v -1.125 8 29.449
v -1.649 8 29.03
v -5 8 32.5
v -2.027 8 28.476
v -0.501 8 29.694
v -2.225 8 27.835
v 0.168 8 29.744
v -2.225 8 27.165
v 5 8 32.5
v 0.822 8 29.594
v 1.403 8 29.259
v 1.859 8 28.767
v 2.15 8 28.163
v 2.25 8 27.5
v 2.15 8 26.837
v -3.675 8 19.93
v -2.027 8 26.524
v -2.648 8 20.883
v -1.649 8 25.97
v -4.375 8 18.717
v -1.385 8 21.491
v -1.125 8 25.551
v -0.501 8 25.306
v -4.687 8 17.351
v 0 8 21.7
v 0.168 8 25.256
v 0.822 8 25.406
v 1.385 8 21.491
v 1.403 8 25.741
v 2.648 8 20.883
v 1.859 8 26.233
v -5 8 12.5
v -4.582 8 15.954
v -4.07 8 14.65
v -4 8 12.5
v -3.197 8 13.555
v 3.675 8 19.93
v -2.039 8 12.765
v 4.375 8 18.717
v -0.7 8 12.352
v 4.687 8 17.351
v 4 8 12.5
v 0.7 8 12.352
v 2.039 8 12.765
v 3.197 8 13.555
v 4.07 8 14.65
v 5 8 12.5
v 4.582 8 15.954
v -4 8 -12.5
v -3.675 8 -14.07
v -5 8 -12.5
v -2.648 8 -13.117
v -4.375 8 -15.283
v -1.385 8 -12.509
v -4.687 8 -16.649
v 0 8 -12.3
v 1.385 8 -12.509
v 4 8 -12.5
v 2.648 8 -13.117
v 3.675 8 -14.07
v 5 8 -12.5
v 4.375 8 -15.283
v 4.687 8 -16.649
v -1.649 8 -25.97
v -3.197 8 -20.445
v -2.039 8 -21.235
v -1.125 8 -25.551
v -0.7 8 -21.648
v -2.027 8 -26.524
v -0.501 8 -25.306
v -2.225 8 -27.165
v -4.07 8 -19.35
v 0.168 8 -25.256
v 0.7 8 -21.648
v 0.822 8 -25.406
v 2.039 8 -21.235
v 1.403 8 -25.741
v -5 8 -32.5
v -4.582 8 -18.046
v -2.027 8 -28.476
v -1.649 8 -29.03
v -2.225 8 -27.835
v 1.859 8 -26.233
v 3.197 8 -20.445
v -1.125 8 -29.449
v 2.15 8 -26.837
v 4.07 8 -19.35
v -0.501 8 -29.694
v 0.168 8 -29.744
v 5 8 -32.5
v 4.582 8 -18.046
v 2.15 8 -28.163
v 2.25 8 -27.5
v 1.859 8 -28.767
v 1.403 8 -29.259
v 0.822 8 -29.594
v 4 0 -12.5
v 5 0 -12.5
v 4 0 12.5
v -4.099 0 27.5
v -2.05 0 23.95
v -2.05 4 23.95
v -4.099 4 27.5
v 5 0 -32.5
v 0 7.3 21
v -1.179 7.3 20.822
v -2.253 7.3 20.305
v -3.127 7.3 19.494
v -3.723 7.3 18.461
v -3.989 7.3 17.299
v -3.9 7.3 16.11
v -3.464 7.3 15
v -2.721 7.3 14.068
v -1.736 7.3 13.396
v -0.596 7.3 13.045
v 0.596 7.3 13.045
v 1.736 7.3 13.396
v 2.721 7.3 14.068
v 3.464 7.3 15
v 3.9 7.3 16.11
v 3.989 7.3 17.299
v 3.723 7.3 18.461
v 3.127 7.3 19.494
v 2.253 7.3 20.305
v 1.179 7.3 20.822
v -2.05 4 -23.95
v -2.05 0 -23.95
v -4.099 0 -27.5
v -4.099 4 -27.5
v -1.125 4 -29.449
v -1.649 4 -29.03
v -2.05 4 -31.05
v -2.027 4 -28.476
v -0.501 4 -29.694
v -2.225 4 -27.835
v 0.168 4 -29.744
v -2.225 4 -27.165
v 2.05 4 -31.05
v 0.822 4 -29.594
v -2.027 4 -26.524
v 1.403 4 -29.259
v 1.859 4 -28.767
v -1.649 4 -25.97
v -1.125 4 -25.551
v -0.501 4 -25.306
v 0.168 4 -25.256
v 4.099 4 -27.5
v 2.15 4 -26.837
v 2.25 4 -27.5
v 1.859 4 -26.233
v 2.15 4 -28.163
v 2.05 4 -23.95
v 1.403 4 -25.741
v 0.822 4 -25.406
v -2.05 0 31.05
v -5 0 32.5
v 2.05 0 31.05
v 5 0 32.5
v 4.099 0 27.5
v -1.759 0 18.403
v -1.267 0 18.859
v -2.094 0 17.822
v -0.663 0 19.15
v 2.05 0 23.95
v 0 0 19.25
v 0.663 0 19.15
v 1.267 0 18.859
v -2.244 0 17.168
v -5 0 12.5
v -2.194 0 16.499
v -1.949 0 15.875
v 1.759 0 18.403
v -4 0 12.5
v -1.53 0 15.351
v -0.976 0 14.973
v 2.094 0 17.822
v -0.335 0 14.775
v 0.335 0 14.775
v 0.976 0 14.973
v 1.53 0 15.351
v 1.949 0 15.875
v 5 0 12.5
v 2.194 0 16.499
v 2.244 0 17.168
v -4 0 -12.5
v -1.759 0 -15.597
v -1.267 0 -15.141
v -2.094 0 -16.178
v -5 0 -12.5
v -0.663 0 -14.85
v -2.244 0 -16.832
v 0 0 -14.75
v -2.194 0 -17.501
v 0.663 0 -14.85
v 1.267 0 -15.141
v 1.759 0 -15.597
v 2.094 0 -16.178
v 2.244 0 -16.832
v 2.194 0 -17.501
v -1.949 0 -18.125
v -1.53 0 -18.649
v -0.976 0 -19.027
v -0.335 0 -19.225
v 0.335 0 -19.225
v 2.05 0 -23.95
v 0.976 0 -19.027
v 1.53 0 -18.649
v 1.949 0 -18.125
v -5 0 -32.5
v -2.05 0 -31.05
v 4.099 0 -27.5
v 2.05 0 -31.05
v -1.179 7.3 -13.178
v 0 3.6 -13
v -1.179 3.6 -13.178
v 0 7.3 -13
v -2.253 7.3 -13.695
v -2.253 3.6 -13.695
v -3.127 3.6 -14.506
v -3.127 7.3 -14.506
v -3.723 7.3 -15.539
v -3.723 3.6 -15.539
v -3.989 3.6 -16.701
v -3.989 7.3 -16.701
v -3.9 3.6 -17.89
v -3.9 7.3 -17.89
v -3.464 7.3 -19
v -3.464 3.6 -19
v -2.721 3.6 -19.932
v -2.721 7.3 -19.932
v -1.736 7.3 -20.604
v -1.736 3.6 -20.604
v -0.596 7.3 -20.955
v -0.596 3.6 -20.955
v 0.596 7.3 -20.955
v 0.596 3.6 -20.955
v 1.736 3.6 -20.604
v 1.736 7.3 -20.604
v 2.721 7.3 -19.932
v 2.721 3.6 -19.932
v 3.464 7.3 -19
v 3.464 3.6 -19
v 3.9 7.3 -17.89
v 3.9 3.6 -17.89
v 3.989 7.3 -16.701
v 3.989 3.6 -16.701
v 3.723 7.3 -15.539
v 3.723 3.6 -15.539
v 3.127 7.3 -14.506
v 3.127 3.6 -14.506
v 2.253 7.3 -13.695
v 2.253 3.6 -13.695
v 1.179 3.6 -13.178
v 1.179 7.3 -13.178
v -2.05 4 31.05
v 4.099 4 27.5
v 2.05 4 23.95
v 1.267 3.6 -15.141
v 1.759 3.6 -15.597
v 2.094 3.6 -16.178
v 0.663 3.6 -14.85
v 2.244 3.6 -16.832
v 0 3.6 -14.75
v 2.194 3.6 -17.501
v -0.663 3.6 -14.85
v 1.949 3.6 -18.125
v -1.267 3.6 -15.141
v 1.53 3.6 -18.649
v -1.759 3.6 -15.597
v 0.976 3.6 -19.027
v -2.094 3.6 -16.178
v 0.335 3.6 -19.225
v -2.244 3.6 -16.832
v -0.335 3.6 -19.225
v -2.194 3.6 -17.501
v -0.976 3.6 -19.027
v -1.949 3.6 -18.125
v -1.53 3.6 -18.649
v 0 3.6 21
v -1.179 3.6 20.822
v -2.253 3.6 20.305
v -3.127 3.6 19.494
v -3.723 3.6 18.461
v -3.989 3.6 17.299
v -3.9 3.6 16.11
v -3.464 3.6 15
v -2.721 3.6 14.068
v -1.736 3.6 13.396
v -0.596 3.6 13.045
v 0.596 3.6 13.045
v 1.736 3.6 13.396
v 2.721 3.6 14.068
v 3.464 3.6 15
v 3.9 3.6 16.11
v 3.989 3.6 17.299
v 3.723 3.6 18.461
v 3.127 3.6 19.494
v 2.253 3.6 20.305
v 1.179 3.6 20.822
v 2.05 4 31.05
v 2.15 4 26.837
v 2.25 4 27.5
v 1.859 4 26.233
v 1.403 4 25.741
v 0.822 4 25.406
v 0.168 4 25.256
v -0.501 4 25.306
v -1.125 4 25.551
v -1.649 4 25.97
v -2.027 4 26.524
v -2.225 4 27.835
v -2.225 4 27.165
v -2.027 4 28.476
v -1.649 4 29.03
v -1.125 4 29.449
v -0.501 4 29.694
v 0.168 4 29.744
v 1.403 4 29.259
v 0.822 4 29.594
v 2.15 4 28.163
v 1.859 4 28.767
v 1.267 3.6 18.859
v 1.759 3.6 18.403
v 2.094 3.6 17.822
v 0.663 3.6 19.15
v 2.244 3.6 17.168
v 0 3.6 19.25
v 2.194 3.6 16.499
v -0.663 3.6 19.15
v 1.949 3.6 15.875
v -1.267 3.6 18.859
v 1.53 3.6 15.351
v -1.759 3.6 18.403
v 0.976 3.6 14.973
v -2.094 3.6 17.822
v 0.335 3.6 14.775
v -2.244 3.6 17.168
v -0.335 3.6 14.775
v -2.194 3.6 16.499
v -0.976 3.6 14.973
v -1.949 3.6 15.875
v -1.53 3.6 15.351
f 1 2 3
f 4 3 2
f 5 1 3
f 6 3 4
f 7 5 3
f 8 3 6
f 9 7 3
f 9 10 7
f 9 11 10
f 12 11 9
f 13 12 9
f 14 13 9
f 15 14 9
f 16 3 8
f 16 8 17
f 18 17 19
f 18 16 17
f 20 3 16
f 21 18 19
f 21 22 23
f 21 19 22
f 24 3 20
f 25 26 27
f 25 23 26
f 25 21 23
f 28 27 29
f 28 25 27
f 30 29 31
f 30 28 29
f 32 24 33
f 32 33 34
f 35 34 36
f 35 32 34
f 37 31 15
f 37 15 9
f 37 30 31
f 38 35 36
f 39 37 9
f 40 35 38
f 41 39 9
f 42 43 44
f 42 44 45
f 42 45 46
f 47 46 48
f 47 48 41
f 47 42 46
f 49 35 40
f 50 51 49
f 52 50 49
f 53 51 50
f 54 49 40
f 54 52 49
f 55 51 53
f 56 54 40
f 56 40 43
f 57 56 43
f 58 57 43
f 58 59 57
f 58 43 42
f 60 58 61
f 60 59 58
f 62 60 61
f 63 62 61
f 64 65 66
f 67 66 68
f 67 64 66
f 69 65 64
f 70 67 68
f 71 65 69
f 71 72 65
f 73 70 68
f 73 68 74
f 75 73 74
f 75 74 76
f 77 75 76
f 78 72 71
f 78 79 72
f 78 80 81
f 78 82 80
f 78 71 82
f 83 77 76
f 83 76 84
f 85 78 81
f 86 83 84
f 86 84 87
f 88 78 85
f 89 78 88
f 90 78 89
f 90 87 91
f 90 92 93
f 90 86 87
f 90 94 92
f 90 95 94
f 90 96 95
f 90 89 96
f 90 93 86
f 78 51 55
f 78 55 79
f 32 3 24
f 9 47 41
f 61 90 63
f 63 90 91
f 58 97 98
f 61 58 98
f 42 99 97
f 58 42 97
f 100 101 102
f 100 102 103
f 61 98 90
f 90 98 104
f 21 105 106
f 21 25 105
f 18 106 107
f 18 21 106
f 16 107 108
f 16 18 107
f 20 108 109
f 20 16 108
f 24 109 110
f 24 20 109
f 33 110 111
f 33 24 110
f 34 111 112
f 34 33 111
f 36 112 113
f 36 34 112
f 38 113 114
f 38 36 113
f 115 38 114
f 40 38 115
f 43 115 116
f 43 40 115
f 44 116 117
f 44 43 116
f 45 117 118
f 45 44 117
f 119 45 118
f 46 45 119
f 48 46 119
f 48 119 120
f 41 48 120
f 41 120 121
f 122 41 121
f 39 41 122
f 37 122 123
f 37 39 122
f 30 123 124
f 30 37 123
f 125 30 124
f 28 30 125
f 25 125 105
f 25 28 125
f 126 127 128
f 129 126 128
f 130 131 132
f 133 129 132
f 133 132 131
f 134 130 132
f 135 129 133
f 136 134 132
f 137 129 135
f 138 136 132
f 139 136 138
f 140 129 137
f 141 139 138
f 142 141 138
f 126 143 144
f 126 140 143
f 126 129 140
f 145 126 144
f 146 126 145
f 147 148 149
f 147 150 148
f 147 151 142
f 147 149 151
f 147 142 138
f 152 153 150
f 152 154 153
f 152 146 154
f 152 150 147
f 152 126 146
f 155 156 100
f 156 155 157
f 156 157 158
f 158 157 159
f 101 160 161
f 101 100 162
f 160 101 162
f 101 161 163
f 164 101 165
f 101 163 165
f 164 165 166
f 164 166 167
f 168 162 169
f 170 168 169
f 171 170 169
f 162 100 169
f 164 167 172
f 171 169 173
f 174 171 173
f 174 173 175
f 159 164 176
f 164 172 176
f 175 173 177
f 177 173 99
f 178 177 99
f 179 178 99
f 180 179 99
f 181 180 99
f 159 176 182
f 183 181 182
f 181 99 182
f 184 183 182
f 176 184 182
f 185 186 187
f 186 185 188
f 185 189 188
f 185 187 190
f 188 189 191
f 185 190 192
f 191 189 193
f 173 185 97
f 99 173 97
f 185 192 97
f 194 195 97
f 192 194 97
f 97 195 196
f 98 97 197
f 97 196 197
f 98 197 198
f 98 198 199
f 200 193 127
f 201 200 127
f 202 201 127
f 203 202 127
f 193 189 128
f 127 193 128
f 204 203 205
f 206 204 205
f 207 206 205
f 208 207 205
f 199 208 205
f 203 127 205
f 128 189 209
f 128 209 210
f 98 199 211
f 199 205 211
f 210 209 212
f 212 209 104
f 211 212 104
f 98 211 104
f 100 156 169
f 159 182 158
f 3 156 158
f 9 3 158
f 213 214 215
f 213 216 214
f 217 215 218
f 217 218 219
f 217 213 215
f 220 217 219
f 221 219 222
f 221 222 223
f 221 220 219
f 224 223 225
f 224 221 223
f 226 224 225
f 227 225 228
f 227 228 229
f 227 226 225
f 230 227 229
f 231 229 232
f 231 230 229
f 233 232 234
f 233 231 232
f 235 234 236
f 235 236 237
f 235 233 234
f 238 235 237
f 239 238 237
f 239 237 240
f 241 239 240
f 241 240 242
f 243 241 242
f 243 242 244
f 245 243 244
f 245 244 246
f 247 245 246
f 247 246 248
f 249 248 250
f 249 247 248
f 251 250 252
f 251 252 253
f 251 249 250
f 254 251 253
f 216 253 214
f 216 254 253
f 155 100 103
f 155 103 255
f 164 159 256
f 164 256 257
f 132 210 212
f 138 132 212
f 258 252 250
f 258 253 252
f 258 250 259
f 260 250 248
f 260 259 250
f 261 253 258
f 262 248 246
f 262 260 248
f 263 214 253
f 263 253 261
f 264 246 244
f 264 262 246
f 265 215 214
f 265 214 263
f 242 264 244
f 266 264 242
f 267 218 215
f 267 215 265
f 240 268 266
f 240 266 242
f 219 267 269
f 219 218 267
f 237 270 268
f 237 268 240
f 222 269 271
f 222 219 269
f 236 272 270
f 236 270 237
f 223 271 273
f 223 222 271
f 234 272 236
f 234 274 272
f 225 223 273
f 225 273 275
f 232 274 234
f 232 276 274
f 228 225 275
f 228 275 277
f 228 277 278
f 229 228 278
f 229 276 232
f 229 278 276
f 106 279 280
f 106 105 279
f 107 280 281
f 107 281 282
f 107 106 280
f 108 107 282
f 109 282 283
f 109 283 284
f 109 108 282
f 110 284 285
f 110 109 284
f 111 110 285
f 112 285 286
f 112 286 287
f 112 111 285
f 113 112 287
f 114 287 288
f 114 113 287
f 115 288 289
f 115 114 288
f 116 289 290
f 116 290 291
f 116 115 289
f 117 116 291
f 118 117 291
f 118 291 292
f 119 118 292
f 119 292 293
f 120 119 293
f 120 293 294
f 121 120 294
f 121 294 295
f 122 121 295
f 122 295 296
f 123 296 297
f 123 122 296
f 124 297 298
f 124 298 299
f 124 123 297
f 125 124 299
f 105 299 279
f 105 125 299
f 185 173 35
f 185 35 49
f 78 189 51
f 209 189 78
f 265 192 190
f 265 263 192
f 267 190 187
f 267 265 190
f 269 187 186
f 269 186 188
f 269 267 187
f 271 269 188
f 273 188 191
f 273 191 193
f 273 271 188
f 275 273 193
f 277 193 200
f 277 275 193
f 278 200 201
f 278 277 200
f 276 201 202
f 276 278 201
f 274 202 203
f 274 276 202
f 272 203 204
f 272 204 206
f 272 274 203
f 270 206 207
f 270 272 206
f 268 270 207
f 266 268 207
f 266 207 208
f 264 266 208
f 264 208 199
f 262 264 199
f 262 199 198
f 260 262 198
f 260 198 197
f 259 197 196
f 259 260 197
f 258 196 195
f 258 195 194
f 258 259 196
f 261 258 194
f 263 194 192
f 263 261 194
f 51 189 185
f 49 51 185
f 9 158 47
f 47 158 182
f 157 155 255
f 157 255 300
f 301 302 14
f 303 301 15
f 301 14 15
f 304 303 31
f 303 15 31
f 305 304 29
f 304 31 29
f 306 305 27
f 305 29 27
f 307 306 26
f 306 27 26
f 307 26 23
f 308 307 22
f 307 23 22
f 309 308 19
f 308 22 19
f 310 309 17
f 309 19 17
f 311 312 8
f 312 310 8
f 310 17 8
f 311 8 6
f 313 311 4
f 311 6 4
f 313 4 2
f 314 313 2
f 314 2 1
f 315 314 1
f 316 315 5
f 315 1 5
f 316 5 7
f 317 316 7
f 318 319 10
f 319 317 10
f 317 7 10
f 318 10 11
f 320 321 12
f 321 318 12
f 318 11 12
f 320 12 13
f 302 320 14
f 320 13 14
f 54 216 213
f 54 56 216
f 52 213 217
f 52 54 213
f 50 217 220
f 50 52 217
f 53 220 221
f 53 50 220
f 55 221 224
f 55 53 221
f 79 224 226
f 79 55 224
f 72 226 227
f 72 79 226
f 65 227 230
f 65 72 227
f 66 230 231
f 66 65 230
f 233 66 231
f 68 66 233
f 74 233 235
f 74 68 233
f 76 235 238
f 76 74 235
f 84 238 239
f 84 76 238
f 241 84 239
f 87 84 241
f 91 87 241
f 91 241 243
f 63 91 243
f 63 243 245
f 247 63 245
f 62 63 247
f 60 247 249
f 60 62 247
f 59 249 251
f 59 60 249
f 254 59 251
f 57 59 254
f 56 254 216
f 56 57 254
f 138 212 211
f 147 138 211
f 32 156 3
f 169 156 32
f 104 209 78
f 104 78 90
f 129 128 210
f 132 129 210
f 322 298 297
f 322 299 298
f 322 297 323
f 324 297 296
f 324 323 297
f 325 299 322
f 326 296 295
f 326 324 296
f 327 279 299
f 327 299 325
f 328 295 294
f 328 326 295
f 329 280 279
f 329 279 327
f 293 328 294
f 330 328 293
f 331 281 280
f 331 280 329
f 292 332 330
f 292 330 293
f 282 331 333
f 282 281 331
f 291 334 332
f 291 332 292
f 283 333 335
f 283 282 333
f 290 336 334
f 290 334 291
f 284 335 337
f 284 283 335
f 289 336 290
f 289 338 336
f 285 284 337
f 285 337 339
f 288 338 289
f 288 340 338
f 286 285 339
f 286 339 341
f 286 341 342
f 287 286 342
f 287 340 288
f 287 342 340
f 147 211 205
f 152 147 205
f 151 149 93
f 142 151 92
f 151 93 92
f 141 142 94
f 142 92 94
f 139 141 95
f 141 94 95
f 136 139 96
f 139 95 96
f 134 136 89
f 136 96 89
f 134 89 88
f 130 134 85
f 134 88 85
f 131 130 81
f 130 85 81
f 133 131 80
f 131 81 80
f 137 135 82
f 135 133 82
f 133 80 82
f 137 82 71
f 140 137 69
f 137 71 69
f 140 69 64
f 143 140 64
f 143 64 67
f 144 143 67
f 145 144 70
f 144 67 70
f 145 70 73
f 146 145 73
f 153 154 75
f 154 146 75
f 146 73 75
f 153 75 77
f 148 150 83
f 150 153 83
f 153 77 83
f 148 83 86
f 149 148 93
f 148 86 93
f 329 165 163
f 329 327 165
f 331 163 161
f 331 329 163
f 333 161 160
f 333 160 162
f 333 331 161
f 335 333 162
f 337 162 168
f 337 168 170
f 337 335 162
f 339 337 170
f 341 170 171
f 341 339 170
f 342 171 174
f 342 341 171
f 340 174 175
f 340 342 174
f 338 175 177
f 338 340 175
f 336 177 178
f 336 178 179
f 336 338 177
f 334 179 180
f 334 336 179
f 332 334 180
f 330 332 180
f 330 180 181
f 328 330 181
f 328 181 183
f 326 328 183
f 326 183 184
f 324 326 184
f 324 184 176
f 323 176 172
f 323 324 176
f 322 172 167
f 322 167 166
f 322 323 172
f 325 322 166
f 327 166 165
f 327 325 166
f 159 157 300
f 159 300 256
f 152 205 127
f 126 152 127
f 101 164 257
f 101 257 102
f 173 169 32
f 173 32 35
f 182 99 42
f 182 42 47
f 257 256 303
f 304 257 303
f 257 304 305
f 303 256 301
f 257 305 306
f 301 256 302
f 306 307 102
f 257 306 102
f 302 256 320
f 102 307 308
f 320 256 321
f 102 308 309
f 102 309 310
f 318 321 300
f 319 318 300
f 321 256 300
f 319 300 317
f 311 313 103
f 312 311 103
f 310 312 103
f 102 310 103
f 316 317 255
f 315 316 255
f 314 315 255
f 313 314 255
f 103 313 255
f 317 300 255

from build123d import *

# Parameters (mm, degrees)
SKETCH_1_W                  = 10
SKETCH_1_H                  = 20
SKETCH_1_W_2                = 8
SKETCH_1_H_2                = 25
EXTRUDE_1_DEPTH             = 8
HOLE_WIZARD_M4_1_AT_2_COUNT = 2
HOLE_WIZARD_M4_1_AT_2_PITCH = 34
HOLE_WIZARD_M4_1_2_D        = 4.5
HOLE_WIZARD_M4_1_2_DEPTH    = 8
SKETCH_7_R                  = 2.25
CUT_EXTRUDE_1_DEPTH         = 4


with BuildPart() as part:
    # 스케치1 → 보스-돌출1 (new body)
    with BuildSketch(Plane(origin=(0, 0, 0), x_dir=(1, 0, 0), z_dir=(0, 1, 0))):
        with Locations((0, 22.5)):
            Rectangle(SKETCH_1_W, SKETCH_1_H)
        Rectangle(SKETCH_1_W_2, SKETCH_1_H_2)
        with Locations((0, -22.5)):
            Rectangle(SKETCH_1_W, SKETCH_1_H)
    extrude(amount=EXTRUDE_1_DEPTH)

    # 스케치3 → Hole Wizard M4 _ _ _ _ _ _1 (revolve, cut)
    with BuildSketch(Plane(origin=(0, 8, -17), x_dir=(0, 0, 1), z_dir=(1, 0, 0))):
        Polygon((0, 0), (0, 8), (2.25, 8), (2.25, 4.4), (4, 4.4), (4, 0.7), (4.7, 0), align=None)
    hole_wizard_m4_1 = revolve(axis=Axis((0, 14.35, -17), (0, -1, 0)), mode=Mode.SUBTRACT)

    # Hole Wizard M4 _ _ _ _ _ _1 at 2: Hole Wizard M4 _ _ _ _ _ _1 ×2
    with Locations(*[(0, 0, i * HOLE_WIZARD_M4_1_AT_2_PITCH) for i in range(1, HOLE_WIZARD_M4_1_AT_2_COUNT)]):
        add(hole_wizard_m4_1, mode=Mode.SUBTRACT)

    # Hole Wizard M4 _ _1 2
    with Locations(Plane(origin=(0, 0, 0), x_dir=(-1, 0, 0), z_dir=(0, -1, 0))):
        with Locations((0, -27.5), (0, 27.5), (54.10839937, -109.42081154)):
            Hole(HOLE_WIZARD_M4_1_2_D / 2, depth=HOLE_WIZARD_M4_1_2_DEPTH)

    # 스케치7 → 컷-돌출1 (cut)
    with BuildSketch(Plane.XZ):
        Polygon((2.049593456, -31.05), (4.099186911, -27.5), (2.049593456, -23.95), (-2.049593456, -23.95), (-4.099186911, -27.5), (-2.049593456, -31.05), align=None)
        with Locations((0, -27.5)):
            Circle(SKETCH_7_R, mode=Mode.SUBTRACT)
        Polygon((2.049593456, 23.95), (-2.049593456, 23.95), (-4.099186911, 27.5), (-2.049593456, 31.05), (2.049593456, 31.05), (4.099186911, 27.5), align=None)
        with Locations((0, 27.5)):
            Circle(SKETCH_7_R, mode=Mode.SUBTRACT)
    extrude(amount=-CUT_EXTRUDE_1_DEPTH, mode=Mode.SUBTRACT)


solid = part.part
